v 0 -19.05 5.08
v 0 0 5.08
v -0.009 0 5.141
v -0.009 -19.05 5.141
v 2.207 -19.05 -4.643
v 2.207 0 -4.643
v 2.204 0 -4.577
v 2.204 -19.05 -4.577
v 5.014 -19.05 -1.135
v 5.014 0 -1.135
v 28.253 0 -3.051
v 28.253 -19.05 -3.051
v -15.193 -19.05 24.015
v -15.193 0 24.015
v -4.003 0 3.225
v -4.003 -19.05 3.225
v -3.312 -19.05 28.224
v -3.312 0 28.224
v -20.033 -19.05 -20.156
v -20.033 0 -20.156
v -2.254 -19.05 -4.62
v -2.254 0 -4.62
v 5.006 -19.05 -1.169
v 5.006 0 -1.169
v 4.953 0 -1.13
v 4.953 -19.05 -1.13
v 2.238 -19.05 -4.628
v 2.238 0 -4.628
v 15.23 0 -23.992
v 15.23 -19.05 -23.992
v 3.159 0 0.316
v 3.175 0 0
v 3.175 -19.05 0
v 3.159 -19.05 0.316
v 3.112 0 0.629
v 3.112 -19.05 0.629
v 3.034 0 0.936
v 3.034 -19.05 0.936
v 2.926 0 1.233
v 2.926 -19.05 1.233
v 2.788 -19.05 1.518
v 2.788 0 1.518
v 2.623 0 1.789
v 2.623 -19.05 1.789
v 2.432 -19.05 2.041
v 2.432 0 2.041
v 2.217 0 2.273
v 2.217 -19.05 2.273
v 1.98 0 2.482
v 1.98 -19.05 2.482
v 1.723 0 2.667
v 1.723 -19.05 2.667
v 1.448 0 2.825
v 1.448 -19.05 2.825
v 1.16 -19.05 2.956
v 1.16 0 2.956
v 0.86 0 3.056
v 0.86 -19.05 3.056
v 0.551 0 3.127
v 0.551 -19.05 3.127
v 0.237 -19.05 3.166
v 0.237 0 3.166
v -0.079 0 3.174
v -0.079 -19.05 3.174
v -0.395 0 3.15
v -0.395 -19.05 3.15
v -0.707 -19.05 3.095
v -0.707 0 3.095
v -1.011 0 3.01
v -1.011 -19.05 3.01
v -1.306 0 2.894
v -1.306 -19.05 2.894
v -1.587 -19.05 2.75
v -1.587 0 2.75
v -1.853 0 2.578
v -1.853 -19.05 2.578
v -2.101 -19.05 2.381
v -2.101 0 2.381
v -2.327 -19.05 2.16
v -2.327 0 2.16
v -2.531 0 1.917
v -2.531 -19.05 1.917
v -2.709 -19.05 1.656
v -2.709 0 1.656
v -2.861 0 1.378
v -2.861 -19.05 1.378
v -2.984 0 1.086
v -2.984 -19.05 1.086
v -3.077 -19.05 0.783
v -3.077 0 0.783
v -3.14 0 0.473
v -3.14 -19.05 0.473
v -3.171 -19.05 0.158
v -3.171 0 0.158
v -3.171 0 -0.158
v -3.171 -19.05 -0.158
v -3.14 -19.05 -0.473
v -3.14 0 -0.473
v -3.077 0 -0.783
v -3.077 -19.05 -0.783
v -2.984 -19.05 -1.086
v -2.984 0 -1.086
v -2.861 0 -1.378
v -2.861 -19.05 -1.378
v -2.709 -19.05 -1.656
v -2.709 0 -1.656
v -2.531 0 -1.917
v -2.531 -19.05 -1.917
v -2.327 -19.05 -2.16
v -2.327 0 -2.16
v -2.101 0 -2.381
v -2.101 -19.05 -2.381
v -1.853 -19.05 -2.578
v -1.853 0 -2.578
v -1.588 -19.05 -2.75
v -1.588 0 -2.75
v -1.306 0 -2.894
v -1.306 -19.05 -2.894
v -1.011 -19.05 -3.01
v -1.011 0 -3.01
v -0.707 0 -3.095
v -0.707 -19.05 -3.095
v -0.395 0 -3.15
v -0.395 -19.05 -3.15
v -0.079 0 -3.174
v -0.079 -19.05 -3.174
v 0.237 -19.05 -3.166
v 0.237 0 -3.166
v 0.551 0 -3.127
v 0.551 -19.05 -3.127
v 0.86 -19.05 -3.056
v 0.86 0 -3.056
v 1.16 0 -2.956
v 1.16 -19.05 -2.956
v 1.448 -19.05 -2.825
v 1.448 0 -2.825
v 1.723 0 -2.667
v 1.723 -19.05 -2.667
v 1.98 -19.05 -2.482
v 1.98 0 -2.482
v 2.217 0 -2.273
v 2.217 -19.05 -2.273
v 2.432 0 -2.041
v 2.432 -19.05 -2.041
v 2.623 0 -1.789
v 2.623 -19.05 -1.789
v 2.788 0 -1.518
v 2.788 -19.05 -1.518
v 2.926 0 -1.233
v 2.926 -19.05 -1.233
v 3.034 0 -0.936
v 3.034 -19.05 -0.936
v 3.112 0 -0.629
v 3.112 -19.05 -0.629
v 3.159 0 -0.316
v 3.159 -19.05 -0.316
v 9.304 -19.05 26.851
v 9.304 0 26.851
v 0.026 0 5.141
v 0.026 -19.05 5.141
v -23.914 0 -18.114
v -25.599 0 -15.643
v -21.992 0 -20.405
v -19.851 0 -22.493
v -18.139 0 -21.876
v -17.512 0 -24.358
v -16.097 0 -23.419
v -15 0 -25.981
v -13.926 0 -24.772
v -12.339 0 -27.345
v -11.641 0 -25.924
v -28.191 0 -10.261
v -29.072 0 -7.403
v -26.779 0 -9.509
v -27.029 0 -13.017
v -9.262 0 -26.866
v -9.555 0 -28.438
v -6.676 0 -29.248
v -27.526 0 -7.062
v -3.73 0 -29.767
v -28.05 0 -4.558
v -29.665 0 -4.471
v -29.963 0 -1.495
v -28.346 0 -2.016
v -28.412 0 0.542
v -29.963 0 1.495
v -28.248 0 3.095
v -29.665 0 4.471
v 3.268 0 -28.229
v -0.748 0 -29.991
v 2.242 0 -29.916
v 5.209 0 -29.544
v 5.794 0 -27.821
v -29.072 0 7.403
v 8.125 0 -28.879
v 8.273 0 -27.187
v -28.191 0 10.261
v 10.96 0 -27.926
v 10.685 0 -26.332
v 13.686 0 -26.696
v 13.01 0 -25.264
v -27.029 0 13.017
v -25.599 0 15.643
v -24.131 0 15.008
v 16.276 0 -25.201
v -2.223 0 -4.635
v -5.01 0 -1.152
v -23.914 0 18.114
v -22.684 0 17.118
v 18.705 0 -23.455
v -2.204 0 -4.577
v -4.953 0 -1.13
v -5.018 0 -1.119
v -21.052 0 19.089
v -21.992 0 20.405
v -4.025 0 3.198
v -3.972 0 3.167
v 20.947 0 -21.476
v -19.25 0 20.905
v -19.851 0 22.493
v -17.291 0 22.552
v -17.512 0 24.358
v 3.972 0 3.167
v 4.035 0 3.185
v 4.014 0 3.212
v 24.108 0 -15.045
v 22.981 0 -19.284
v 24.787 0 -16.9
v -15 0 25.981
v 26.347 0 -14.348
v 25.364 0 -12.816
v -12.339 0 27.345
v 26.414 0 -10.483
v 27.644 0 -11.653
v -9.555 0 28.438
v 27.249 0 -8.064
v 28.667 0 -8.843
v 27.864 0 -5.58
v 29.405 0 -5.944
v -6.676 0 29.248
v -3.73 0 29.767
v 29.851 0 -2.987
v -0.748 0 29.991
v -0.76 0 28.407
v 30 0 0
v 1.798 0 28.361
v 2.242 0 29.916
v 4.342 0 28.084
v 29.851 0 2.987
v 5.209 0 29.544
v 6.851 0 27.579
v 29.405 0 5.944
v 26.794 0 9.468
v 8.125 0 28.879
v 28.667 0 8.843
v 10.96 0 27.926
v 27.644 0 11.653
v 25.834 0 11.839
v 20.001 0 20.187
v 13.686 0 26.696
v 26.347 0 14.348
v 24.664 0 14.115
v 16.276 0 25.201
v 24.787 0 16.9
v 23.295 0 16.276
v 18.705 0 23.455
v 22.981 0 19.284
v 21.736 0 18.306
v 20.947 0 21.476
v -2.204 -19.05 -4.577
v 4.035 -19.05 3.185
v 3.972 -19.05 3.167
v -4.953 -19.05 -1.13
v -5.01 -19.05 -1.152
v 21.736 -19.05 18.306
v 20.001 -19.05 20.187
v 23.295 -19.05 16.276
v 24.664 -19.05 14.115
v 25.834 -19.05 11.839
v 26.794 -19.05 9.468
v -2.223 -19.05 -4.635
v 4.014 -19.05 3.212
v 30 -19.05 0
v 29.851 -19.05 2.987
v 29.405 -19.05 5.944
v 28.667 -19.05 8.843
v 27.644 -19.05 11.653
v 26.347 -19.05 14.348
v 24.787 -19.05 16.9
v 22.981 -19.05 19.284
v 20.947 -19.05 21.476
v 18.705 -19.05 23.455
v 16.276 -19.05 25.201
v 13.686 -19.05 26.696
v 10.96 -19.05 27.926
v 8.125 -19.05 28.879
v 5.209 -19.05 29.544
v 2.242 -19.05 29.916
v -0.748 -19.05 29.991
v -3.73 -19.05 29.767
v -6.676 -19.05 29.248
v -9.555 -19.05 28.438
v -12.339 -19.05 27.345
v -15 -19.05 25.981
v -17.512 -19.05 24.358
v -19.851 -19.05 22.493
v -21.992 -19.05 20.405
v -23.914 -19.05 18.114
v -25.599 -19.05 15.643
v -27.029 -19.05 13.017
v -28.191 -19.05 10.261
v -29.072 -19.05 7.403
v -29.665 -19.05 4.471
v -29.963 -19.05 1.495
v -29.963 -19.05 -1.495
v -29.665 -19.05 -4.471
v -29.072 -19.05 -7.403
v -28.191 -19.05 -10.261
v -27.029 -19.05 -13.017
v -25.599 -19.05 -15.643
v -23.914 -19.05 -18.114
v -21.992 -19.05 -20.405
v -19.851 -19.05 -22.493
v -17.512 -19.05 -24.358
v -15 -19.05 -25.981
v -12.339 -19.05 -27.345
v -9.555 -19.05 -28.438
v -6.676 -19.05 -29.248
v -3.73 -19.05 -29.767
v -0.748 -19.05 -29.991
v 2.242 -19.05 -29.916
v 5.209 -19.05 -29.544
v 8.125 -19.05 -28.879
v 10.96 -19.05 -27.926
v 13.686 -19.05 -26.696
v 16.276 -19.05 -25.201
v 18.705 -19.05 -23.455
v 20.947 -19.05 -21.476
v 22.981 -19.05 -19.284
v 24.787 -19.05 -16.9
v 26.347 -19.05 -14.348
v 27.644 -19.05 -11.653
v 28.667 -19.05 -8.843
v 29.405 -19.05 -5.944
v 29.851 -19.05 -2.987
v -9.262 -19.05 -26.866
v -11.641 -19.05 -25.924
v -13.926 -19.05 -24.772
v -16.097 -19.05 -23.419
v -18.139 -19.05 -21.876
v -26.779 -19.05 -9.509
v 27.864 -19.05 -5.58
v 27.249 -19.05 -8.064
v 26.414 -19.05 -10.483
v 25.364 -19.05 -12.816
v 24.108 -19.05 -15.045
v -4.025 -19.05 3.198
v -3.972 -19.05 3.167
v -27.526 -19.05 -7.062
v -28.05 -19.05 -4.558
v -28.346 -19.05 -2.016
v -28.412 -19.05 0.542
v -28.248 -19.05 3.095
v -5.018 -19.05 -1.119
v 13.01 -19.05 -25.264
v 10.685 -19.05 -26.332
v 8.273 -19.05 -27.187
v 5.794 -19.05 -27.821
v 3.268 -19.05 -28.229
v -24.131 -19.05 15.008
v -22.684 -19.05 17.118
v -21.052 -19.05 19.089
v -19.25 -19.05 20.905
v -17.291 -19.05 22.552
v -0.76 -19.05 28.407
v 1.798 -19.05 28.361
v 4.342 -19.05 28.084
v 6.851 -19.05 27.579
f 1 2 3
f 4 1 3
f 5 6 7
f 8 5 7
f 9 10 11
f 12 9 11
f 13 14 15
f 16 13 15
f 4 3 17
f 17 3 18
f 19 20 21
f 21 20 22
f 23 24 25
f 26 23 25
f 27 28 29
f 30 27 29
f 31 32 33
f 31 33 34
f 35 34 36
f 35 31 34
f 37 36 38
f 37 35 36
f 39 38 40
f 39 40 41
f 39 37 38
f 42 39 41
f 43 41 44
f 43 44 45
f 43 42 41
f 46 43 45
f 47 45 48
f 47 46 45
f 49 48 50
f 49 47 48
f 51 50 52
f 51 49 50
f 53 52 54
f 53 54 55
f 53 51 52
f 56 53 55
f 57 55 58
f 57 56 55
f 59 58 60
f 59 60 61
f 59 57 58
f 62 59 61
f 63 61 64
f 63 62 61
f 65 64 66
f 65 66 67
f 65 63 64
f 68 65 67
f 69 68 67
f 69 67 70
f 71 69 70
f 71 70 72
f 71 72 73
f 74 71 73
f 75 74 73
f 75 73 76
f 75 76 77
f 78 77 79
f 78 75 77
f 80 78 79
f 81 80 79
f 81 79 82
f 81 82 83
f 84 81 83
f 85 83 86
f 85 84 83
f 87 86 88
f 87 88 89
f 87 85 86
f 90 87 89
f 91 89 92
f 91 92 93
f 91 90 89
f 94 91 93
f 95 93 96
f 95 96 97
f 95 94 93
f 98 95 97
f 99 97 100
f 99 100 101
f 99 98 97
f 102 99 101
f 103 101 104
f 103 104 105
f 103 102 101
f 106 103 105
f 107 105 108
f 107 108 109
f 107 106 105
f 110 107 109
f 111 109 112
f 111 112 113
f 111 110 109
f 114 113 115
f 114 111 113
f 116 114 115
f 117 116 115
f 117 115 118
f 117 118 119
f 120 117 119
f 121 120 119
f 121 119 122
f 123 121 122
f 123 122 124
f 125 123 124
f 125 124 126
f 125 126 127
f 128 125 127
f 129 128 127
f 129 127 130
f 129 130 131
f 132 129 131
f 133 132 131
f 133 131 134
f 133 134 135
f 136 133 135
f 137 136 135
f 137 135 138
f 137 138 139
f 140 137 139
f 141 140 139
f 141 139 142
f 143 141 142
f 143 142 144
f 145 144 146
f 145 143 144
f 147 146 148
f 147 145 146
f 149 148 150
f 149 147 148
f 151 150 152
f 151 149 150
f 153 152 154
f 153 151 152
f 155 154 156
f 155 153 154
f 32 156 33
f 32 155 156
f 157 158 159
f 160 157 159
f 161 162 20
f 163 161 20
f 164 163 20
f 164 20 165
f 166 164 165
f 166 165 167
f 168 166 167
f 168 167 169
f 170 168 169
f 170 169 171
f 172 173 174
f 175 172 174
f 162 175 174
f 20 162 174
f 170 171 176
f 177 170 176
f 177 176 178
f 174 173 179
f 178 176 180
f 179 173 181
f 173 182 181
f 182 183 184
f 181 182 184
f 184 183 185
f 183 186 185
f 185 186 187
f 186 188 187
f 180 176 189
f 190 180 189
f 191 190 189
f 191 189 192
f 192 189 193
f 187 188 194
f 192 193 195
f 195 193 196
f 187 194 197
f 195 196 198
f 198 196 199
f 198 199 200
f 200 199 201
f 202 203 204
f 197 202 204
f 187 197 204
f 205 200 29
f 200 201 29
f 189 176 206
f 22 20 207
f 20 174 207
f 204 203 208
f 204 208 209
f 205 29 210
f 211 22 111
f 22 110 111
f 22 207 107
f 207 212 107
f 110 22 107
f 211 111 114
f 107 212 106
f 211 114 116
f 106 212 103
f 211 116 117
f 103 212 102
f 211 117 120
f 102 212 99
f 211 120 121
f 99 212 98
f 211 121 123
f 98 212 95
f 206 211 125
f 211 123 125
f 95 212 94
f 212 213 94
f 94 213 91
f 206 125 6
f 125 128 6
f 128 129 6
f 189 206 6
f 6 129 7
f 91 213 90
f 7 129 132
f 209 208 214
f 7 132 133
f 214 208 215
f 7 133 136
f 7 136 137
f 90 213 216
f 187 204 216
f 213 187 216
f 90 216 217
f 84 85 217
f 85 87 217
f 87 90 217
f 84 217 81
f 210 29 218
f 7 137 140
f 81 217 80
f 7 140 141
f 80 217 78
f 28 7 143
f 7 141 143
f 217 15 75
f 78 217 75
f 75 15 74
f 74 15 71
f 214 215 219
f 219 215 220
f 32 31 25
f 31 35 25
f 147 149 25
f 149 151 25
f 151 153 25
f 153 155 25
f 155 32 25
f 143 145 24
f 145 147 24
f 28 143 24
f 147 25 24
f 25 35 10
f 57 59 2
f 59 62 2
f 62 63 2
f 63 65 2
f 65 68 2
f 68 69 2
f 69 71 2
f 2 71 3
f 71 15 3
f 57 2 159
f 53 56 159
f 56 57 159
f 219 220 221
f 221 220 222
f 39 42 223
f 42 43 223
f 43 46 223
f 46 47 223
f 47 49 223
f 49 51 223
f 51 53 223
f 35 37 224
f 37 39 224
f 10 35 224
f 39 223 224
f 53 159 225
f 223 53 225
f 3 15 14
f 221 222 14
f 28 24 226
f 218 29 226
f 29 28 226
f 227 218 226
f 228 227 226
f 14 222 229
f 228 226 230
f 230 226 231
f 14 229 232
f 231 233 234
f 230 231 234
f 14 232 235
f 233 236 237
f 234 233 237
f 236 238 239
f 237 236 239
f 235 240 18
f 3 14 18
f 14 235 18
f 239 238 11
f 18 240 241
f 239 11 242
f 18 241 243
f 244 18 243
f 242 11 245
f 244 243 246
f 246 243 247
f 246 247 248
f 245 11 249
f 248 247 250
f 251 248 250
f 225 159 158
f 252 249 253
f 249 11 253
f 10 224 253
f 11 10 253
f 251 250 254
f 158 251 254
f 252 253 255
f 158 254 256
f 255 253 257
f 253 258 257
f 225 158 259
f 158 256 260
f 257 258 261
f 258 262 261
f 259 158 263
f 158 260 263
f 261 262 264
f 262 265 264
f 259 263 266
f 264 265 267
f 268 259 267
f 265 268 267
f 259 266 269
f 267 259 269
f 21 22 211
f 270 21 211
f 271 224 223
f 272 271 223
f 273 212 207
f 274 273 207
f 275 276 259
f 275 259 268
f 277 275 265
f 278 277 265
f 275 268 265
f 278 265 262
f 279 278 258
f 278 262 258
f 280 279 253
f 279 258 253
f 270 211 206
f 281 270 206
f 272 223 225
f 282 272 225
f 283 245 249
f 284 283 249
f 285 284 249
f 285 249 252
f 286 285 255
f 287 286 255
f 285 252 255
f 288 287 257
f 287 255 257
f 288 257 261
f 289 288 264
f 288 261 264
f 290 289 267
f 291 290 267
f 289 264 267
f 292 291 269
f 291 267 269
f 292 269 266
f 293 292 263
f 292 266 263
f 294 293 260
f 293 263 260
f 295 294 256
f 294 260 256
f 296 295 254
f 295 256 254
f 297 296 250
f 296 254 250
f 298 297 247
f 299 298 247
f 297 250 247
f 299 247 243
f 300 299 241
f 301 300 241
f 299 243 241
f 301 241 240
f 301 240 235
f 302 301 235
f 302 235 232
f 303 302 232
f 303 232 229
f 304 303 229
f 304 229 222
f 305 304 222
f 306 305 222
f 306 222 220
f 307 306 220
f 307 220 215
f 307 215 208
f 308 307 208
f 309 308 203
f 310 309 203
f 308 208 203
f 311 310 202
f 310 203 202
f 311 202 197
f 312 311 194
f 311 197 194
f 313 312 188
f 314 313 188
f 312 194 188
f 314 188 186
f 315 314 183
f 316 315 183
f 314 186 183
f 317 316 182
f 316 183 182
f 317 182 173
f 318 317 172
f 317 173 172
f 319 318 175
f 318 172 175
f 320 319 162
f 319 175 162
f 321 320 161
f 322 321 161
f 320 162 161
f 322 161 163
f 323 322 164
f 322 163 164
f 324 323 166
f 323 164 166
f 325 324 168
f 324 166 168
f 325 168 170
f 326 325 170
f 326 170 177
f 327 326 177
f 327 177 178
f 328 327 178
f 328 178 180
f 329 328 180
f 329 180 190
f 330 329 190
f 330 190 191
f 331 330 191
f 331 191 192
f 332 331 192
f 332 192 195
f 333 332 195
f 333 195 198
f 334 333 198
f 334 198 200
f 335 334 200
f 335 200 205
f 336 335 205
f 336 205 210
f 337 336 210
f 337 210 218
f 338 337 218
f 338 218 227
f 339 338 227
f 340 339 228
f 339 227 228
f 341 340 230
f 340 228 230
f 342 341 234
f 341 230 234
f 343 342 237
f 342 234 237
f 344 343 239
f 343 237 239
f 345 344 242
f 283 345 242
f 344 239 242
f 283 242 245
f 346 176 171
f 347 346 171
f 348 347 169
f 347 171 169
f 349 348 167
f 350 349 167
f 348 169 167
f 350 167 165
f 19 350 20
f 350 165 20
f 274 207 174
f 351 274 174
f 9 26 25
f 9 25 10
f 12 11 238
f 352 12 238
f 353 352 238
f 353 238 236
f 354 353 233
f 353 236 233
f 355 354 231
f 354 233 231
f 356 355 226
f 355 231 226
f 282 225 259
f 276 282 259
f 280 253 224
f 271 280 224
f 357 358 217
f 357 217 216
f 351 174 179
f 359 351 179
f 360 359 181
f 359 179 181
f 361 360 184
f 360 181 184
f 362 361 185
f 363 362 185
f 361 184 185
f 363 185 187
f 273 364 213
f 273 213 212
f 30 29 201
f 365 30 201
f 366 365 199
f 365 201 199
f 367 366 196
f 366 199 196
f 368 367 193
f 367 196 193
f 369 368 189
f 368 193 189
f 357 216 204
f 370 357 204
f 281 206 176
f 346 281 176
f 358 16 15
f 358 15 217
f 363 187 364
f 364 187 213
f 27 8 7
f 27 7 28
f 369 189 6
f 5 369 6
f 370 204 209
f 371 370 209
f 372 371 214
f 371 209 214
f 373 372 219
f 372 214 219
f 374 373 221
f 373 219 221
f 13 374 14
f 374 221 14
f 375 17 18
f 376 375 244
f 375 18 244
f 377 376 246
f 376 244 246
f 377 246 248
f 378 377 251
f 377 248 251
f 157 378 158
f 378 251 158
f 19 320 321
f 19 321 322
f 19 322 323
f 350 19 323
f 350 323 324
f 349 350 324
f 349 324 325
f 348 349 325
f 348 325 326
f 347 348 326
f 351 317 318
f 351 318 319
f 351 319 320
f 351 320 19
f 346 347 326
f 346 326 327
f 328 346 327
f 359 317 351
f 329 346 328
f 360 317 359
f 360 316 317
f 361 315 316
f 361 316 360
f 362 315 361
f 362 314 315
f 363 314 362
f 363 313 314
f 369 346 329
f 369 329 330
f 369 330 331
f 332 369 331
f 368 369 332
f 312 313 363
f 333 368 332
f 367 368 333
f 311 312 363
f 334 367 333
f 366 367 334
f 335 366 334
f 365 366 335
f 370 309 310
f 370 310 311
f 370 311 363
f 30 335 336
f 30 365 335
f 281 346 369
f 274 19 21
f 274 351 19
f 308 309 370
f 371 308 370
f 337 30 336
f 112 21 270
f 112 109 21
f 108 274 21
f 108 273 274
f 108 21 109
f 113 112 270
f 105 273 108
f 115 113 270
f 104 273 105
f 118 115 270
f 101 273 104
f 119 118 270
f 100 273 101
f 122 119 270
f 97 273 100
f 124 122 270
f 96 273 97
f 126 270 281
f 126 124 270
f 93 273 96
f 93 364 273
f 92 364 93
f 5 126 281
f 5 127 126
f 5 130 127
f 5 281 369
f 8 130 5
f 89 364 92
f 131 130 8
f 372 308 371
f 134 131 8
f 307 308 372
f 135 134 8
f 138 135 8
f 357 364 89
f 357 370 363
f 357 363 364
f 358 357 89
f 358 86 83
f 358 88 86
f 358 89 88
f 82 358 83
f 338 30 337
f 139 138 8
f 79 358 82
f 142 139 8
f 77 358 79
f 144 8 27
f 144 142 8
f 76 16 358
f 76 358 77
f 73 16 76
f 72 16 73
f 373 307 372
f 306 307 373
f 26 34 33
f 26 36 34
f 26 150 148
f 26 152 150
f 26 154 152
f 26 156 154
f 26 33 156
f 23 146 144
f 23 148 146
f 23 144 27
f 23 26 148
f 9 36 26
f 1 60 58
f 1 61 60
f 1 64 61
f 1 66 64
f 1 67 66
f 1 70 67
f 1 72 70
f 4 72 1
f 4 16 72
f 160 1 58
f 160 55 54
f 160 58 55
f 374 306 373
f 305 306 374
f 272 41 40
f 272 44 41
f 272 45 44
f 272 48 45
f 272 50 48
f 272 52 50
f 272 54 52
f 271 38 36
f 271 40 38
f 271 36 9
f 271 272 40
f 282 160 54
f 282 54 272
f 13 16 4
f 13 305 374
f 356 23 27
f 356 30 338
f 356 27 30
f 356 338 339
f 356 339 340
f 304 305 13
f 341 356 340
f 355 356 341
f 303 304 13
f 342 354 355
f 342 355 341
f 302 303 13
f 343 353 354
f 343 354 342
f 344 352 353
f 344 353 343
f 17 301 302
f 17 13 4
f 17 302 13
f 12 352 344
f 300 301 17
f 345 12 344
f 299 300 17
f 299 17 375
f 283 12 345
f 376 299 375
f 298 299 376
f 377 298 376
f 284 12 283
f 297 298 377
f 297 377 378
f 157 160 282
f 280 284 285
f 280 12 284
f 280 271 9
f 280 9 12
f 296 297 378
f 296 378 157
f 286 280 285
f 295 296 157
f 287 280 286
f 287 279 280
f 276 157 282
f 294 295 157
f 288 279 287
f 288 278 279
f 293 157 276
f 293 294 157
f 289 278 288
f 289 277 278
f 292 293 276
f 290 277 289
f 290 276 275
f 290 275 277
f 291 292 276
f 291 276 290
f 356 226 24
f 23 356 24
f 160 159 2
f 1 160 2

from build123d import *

# Parameters (mm, degrees)
F0_R     = 30
F1_DEPTH = 19.05
F0_R_2   = 3.175
F2_DEPTH = 19.05


with BuildPart() as f1:
    # F0 (on Front) → F1 (new body)
    with BuildSketch(Plane.XZ):
        Circle(F0_R)
        with BuildLine():
            ThreePointArc((-15.1925895519, 24.0154928425), (-9.4885710036, 26.7866700818), (-3.3120353789, 28.2239099951))
            ThreePointArc((-3.3120353789, 28.2239099951), (3.0733934985, 28.2508924844), (9.3036437218, 26.8514596858))
            ThreePointArc((9.3036437218, 26.8514596858), (15.0266347255, 24.119679156), (20.0013211104, 20.1867735808))
            ThreePointArc((20.0013211104, 20.1867735808), (24.0036666555, 15.2112675623), (26.7940435133, 9.4677297158))
            ThreePointArc((26.7940435133, 9.4677297158), (28.0087527775, 4.8029617543), (28.4175768454, 0))
            ThreePointArc((28.4175768454, 0), (28.376471618, -1.5279176275), (28.2532748509, -3.051415075))
            ThreePointArc((28.2532748509, -3.051415075), (26.8586892354, -9.2827520875), (24.1079820404, -15.0453938367))
            ThreePointArc((24.1079820404, -15.0453938367), (20.1712076487, -20.0170191526), (15.229936367, -23.9918259418))
            ThreePointArc((15.229936367, -23.9918259418), (9.4885710036, -26.7866700818), (3.2681183779, -28.2290289601))
            ThreePointArc((3.2681183779, -28.2290289601), (-3.0733934985, -28.2508924844), (-9.2618548354, -26.8659025303))
            ThreePointArc((-9.2618548354, -26.8659025303), (-15.0266347255, -24.119679156), (-20.0327050806, -20.1556295092))
            ThreePointArc((-20.0327050806, -20.1556295092), (-24.0036666555, -15.2112675623), (-26.7792804393, -9.509406549))
            ThreePointArc((-26.7792804393, -9.509406549), (-28.2264780188, -3.2900778739), (-28.2484930207, 3.095370062))
            ThreePointArc((-28.2484930207, 3.095370062), (-26.8586892354, 9.2827520875), (-24.1313616746, 15.0078665203))
            ThreePointArc((-24.1313616746, 15.0078665203), (-20.1712076487, 20.0170191526), (-15.1925895519, 24.0154928425))
        make_face(mode=Mode.SUBTRACT)
    extrude(amount=F1_DEPTH)

    # F0 (on Front) → F2 (join)
    with BuildSketch(Plane.XZ):
        with BuildLine():
            Line((-0.0086937801, 5.1407505785), (-3.3120353789, 28.2239099951))
            ThreePointArc((-3.3120353789, 28.2239099951), (-9.4885710036, 26.7866700818), (-15.1925895519, 24.0154928425))
            Line((-15.1925895519, 24.0154928425), (-4.0029845, 3.2254468194))
            ThreePointArc((-4.0029845, 3.2254468194), (-2.2227208053, 4.6353968885), (-0.0086937801, 5.1407505785))
        make_face()
        with BuildLine():
            ThreePointArc((20.0013211104, 20.1867735808), (15.0266347255, 24.119679156), (9.3036437218, 26.8514596858))
            Line((9.3036437218, 26.8514596858), (0.0259358557, 5.1406925043))
            ThreePointArc((0.0259358557, 5.1406925043), (2.2382554667, 4.6279157898), (4.0137801625, 3.2120026306))
            Line((4.0137801625, 3.2120026306), (20.0013211104, 20.1867735808))
        make_face()
        with BuildLine():
            ThreePointArc((28.4175768454, 0), (28.0087527775, 4.8029617543), (26.7940435133, 9.4677297158))
            Line((26.7940435133, 9.4677297158), (4.035325983, 3.1848918824))
            ThreePointArc((4.035325983, 3.1848918824), (4.8565433251, 1.6856390547), (5.1407579297, 0))
            ThreePointArc((5.1407579297, 0), (5.108918794, -0.5712625033), (5.0137957766, -1.135448811))
            Line((5.0137957766, -1.135448811), (28.2532748509, -3.051415075))
            ThreePointArc((28.2532748509, -3.051415075), (28.376471618, -1.5279176275), (28.4175768454, 0))
        make_face()
        with BuildLine():
            ThreePointArc((15.229936367, -23.9918259418), (20.1712076487, -20.0170191526), (24.1079820404, -15.0453938367))
            Line((24.1079820404, -15.0453938367), (5.0060333395, -1.1691972868))
            ThreePointArc((5.0060333395, -1.1691972868), (4.0138255819, -3.2119458729), (2.2383209081, -4.627884139))
            Line((2.2383209081, -4.627884139), (15.229936367, -23.9918259418))
        make_face()
        with BuildLine():
            Line((-2.2226552576, -4.6354283187), (-9.2618548354, -26.8659025303))
            ThreePointArc((-9.2618548354, -26.8659025303), (-3.0733934985, -28.2508924844), (3.2681183779, -28.2290289601))
            Line((3.2681183779, -28.2290289601), (2.2070954869, -4.6428570518))
            ThreePointArc((2.2070954869, -4.6428570518), (-0.0086210867, -5.1407507009), (-2.2226552576, -4.6354283187))
        make_face()
        with BuildLine():
            Line((-5.0099266804, -1.1524004289), (-26.7792804393, -9.509406549))
            ThreePointArc((-26.7792804393, -9.509406549), (-24.0036666555, -15.2112675623), (-20.0327050806, -20.1556295092))
            Line((-20.0327050806, -20.1556295092), (-2.2538302839, -4.6203507598))
            ThreePointArc((-2.2538302839, -4.6203507598), (-4.0245759011, -3.1984653989), (-5.0099266804, -1.1524004289))
        make_face()
        with BuildLine():
            Line((-4.024621129, 3.1984084886), (-24.1313616746, 15.0078665203))
            ThreePointArc((-24.1313616746, 15.0078665203), (-26.8586892354, 9.2827520875), (-28.2484930207, 3.095370062))
            Line((-28.2484930207, 3.095370062), (-5.0175758812, -1.1186261076))
            ThreePointArc((-5.0175758812, -1.1186261076), (-5.0099429756, 1.1523295852), (-4.024621129, 3.1984084886))
        make_face()
        with BuildLine():
            Line((0, 5.08), (-0.0086937801, 5.1407505785))
            ThreePointArc((-0.0086937801, 5.1407505785), (-2.2227208053, 4.6353968885), (-4.0029845, 3.2254468194))
            Line((-4.0029845, 3.2254468194), (-3.9717039309, 3.1673281934))
            Line((-3.9717039309, 3.1673281934), (-4.024621129, 3.1984084886))
            ThreePointArc((-4.024621129, 3.1984084886), (-5.0099429756, 1.1523295852), (-5.0175758812, -1.1186261076))
            Line((-5.0175758812, -1.1186261076), (-4.9526337939, -1.1304063445))
            Line((-4.9526337939, -1.1304063445), (-5.0099266804, -1.1524004289))
            ThreePointArc((-5.0099266804, -1.1524004289), (-4.0245759011, -3.1984653989), (-2.2538302839, -4.6203507598))
            Line((-2.2538302839, -4.6203507598), (-2.2041293947, -4.5769218489))
            Line((-2.2041293947, -4.5769218489), (-2.2226552576, -4.6354283187))
            ThreePointArc((-2.2226552576, -4.6354283187), (-0.0086210867, -5.1407507009), (2.2070954869, -4.6428570518))
            Line((2.2070954869, -4.6428570518), (2.2041293947, -4.5769218489))
            Line((2.2041293947, -4.5769218489), (2.2383209081, -4.627884139))
            ThreePointArc((2.2383209081, -4.627884139), (4.0138255819, -3.2119458729), (5.0060333395, -1.1691972868))
            Line((5.0060333395, -1.1691972868), (4.9526337939, -1.1304063445))
            Line((4.9526337939, -1.1304063445), (5.0137957766, -1.135448811))
            ThreePointArc((5.0137957766, -1.135448811), (5.108918794, -0.5712625033), (5.1407579297, 0))
            ThreePointArc((5.1407579297, 0), (4.8565433251, 1.6856390547), (4.035325983, 3.1848918824))
            Line((4.035325983, 3.1848918824), (3.9717039309, 3.1673281934))
            Line((3.9717039309, 3.1673281934), (4.0137801625, 3.2120026306))
            ThreePointArc((4.0137801625, 3.2120026306), (2.2382554667, 4.6279157898), (0.0259358557, 5.1406925043))
            Line((0.0259358557, 5.1406925043), (0, 5.08))
        make_face()
        Circle(F0_R_2, mode=Mode.SUBTRACT)
    extrude(amount=F2_DEPTH)


solid = f1.part
